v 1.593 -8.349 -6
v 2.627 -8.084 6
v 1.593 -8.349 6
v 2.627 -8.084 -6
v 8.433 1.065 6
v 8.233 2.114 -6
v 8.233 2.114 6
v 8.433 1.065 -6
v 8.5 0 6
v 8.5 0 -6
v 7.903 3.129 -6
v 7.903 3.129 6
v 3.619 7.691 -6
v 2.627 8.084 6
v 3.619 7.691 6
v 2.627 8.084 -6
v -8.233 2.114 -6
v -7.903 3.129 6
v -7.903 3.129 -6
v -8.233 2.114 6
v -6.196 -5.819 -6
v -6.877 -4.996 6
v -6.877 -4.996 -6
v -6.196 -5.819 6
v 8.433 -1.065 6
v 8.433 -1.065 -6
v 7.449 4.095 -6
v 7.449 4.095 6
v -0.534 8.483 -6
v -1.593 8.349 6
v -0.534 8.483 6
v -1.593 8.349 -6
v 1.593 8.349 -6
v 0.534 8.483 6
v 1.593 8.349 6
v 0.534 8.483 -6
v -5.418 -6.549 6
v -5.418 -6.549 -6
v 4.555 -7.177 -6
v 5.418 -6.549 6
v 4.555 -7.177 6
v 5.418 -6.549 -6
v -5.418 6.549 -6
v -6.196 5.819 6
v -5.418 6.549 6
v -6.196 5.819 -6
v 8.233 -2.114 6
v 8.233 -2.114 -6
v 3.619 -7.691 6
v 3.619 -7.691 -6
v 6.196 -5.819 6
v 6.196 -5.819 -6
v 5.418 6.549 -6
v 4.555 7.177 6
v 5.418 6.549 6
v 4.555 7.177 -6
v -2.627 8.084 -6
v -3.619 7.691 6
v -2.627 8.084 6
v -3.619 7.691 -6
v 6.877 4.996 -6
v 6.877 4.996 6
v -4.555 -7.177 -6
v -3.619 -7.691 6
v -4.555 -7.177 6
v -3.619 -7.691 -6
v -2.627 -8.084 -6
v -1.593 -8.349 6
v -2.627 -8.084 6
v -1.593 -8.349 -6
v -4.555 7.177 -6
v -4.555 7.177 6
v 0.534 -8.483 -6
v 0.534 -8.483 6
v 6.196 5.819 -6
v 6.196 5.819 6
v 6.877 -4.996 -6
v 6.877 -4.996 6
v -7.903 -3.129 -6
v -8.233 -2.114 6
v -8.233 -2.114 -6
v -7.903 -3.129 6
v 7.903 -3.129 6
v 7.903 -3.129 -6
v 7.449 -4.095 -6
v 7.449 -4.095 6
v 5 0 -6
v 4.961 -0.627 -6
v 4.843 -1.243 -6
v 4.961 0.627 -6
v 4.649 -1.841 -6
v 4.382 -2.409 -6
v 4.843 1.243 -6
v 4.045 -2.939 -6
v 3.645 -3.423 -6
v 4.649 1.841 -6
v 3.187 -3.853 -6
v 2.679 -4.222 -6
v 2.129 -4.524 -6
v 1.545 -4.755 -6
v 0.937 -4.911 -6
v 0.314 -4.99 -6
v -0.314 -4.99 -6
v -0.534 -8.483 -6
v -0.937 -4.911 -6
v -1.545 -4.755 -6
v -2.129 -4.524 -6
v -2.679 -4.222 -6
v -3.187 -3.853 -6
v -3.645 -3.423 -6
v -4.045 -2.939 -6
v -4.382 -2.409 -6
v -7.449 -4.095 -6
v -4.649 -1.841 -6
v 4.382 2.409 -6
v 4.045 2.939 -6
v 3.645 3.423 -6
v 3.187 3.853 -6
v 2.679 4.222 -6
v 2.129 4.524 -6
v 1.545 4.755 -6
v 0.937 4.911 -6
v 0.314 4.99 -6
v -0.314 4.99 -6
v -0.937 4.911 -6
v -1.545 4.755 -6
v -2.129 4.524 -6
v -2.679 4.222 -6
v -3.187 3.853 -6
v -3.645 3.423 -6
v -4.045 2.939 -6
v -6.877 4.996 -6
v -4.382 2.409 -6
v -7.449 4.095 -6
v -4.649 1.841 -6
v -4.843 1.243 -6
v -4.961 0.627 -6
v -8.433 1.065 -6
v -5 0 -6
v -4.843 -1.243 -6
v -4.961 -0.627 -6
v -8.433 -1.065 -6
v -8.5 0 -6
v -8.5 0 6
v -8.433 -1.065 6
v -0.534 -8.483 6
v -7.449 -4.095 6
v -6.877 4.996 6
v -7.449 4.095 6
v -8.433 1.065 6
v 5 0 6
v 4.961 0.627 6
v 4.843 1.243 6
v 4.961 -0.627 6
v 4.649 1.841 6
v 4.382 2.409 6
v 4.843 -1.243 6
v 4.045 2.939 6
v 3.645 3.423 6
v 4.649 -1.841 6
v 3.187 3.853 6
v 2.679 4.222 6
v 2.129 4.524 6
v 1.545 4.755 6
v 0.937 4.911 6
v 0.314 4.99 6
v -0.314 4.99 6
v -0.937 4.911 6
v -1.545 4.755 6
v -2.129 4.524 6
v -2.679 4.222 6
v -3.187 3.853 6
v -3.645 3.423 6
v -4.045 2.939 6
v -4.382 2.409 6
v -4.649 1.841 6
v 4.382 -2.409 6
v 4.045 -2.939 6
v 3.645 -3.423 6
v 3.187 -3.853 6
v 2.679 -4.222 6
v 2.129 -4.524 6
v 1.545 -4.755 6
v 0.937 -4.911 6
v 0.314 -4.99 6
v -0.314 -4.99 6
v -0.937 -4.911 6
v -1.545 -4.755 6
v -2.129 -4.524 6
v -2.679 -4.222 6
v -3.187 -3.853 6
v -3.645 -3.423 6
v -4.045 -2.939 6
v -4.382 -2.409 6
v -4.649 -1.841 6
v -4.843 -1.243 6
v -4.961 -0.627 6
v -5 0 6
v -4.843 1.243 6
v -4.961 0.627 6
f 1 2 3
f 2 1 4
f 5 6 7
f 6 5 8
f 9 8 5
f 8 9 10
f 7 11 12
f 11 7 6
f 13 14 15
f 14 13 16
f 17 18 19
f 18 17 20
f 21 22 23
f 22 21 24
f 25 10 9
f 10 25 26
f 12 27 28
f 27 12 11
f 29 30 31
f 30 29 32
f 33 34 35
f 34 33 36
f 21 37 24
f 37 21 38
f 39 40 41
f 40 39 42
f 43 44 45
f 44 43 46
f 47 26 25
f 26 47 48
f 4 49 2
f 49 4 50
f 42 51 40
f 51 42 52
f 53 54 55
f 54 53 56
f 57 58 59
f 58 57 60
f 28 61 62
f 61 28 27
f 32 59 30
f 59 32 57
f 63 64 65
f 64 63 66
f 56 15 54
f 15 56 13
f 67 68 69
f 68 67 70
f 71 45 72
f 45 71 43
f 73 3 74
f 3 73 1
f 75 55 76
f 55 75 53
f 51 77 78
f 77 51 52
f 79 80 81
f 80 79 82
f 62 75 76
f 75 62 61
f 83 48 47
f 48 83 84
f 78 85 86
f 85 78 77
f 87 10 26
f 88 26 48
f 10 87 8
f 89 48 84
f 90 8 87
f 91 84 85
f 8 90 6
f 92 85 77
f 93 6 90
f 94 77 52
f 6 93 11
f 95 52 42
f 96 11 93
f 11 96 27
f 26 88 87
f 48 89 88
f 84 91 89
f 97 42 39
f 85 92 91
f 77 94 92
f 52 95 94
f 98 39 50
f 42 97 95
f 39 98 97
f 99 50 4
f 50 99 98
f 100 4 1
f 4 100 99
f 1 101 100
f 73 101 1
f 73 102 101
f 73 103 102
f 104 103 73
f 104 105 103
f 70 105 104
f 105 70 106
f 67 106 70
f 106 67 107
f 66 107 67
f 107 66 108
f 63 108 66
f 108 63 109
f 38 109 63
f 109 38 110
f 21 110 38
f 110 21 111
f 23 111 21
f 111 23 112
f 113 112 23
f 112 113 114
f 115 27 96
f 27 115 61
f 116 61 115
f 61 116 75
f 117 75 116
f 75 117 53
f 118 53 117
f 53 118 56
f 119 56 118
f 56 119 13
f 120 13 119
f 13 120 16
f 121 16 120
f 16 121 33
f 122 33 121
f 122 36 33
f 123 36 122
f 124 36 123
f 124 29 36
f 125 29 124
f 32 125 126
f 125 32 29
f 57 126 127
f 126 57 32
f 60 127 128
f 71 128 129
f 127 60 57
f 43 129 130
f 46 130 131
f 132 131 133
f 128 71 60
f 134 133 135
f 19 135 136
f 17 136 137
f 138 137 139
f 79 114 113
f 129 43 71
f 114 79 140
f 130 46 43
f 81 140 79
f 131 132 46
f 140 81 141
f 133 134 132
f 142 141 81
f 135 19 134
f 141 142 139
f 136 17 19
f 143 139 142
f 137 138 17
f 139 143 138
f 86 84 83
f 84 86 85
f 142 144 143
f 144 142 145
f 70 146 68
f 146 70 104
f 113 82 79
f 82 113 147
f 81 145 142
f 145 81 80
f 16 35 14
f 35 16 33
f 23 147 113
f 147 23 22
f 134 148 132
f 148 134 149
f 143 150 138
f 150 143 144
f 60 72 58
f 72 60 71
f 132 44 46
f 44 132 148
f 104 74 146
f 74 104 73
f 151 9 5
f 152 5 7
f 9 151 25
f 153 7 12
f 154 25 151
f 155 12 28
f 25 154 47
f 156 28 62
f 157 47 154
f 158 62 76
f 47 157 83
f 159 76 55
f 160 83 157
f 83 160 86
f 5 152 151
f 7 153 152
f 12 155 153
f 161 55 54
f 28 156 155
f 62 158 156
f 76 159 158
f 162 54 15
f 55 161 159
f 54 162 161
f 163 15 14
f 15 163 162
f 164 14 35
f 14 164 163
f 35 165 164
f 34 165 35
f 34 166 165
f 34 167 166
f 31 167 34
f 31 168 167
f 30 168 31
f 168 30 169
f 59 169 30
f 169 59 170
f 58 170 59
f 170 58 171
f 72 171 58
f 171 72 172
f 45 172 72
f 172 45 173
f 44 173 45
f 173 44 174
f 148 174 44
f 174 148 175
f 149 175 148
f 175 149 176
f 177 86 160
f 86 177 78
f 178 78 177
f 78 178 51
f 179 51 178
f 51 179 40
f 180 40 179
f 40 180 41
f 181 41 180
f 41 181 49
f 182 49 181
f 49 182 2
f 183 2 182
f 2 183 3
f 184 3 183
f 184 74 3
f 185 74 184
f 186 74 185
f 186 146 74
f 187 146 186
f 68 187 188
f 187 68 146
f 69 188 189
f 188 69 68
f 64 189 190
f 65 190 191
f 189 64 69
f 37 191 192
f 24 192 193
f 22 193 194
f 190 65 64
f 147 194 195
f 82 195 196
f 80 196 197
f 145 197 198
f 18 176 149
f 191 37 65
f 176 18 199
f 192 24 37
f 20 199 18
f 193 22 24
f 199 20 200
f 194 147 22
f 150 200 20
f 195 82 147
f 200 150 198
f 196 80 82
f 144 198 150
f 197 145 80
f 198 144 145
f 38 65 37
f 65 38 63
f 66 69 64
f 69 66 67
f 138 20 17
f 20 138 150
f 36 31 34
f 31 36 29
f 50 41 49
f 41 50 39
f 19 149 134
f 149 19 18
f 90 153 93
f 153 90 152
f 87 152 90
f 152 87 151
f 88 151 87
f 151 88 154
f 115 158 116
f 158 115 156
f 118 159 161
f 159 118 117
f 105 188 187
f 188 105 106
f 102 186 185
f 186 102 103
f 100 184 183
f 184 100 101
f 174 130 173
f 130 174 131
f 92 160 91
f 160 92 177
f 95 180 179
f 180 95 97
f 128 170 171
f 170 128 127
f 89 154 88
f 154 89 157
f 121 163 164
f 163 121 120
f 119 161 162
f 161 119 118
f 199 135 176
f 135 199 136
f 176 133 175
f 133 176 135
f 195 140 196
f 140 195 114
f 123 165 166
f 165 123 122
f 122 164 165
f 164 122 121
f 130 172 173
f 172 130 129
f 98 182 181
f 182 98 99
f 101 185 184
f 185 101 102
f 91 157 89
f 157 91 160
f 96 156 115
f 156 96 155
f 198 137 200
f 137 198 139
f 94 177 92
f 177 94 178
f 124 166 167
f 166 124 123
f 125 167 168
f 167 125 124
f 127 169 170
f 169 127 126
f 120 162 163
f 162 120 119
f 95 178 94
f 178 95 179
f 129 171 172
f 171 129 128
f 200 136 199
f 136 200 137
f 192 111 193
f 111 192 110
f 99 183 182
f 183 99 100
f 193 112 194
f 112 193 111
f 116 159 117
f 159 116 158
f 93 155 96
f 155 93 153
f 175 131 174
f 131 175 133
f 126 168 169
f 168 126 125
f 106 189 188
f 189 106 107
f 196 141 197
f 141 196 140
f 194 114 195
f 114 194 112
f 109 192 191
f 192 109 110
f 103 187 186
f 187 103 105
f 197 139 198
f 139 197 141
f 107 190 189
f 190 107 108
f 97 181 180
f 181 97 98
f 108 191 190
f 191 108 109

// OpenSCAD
$fn = 50;


difference() {
	union() {
		translate(v = [0, 0, -6.0000000000]) {
			cylinder(h = 12, r = 8.5000000000);
		}
	}
	union() {
		translate(v = [0, 0, -100.0000000000]) {
			cylinder(h = 200, r = 5.0000000000);
		}
	}
}
